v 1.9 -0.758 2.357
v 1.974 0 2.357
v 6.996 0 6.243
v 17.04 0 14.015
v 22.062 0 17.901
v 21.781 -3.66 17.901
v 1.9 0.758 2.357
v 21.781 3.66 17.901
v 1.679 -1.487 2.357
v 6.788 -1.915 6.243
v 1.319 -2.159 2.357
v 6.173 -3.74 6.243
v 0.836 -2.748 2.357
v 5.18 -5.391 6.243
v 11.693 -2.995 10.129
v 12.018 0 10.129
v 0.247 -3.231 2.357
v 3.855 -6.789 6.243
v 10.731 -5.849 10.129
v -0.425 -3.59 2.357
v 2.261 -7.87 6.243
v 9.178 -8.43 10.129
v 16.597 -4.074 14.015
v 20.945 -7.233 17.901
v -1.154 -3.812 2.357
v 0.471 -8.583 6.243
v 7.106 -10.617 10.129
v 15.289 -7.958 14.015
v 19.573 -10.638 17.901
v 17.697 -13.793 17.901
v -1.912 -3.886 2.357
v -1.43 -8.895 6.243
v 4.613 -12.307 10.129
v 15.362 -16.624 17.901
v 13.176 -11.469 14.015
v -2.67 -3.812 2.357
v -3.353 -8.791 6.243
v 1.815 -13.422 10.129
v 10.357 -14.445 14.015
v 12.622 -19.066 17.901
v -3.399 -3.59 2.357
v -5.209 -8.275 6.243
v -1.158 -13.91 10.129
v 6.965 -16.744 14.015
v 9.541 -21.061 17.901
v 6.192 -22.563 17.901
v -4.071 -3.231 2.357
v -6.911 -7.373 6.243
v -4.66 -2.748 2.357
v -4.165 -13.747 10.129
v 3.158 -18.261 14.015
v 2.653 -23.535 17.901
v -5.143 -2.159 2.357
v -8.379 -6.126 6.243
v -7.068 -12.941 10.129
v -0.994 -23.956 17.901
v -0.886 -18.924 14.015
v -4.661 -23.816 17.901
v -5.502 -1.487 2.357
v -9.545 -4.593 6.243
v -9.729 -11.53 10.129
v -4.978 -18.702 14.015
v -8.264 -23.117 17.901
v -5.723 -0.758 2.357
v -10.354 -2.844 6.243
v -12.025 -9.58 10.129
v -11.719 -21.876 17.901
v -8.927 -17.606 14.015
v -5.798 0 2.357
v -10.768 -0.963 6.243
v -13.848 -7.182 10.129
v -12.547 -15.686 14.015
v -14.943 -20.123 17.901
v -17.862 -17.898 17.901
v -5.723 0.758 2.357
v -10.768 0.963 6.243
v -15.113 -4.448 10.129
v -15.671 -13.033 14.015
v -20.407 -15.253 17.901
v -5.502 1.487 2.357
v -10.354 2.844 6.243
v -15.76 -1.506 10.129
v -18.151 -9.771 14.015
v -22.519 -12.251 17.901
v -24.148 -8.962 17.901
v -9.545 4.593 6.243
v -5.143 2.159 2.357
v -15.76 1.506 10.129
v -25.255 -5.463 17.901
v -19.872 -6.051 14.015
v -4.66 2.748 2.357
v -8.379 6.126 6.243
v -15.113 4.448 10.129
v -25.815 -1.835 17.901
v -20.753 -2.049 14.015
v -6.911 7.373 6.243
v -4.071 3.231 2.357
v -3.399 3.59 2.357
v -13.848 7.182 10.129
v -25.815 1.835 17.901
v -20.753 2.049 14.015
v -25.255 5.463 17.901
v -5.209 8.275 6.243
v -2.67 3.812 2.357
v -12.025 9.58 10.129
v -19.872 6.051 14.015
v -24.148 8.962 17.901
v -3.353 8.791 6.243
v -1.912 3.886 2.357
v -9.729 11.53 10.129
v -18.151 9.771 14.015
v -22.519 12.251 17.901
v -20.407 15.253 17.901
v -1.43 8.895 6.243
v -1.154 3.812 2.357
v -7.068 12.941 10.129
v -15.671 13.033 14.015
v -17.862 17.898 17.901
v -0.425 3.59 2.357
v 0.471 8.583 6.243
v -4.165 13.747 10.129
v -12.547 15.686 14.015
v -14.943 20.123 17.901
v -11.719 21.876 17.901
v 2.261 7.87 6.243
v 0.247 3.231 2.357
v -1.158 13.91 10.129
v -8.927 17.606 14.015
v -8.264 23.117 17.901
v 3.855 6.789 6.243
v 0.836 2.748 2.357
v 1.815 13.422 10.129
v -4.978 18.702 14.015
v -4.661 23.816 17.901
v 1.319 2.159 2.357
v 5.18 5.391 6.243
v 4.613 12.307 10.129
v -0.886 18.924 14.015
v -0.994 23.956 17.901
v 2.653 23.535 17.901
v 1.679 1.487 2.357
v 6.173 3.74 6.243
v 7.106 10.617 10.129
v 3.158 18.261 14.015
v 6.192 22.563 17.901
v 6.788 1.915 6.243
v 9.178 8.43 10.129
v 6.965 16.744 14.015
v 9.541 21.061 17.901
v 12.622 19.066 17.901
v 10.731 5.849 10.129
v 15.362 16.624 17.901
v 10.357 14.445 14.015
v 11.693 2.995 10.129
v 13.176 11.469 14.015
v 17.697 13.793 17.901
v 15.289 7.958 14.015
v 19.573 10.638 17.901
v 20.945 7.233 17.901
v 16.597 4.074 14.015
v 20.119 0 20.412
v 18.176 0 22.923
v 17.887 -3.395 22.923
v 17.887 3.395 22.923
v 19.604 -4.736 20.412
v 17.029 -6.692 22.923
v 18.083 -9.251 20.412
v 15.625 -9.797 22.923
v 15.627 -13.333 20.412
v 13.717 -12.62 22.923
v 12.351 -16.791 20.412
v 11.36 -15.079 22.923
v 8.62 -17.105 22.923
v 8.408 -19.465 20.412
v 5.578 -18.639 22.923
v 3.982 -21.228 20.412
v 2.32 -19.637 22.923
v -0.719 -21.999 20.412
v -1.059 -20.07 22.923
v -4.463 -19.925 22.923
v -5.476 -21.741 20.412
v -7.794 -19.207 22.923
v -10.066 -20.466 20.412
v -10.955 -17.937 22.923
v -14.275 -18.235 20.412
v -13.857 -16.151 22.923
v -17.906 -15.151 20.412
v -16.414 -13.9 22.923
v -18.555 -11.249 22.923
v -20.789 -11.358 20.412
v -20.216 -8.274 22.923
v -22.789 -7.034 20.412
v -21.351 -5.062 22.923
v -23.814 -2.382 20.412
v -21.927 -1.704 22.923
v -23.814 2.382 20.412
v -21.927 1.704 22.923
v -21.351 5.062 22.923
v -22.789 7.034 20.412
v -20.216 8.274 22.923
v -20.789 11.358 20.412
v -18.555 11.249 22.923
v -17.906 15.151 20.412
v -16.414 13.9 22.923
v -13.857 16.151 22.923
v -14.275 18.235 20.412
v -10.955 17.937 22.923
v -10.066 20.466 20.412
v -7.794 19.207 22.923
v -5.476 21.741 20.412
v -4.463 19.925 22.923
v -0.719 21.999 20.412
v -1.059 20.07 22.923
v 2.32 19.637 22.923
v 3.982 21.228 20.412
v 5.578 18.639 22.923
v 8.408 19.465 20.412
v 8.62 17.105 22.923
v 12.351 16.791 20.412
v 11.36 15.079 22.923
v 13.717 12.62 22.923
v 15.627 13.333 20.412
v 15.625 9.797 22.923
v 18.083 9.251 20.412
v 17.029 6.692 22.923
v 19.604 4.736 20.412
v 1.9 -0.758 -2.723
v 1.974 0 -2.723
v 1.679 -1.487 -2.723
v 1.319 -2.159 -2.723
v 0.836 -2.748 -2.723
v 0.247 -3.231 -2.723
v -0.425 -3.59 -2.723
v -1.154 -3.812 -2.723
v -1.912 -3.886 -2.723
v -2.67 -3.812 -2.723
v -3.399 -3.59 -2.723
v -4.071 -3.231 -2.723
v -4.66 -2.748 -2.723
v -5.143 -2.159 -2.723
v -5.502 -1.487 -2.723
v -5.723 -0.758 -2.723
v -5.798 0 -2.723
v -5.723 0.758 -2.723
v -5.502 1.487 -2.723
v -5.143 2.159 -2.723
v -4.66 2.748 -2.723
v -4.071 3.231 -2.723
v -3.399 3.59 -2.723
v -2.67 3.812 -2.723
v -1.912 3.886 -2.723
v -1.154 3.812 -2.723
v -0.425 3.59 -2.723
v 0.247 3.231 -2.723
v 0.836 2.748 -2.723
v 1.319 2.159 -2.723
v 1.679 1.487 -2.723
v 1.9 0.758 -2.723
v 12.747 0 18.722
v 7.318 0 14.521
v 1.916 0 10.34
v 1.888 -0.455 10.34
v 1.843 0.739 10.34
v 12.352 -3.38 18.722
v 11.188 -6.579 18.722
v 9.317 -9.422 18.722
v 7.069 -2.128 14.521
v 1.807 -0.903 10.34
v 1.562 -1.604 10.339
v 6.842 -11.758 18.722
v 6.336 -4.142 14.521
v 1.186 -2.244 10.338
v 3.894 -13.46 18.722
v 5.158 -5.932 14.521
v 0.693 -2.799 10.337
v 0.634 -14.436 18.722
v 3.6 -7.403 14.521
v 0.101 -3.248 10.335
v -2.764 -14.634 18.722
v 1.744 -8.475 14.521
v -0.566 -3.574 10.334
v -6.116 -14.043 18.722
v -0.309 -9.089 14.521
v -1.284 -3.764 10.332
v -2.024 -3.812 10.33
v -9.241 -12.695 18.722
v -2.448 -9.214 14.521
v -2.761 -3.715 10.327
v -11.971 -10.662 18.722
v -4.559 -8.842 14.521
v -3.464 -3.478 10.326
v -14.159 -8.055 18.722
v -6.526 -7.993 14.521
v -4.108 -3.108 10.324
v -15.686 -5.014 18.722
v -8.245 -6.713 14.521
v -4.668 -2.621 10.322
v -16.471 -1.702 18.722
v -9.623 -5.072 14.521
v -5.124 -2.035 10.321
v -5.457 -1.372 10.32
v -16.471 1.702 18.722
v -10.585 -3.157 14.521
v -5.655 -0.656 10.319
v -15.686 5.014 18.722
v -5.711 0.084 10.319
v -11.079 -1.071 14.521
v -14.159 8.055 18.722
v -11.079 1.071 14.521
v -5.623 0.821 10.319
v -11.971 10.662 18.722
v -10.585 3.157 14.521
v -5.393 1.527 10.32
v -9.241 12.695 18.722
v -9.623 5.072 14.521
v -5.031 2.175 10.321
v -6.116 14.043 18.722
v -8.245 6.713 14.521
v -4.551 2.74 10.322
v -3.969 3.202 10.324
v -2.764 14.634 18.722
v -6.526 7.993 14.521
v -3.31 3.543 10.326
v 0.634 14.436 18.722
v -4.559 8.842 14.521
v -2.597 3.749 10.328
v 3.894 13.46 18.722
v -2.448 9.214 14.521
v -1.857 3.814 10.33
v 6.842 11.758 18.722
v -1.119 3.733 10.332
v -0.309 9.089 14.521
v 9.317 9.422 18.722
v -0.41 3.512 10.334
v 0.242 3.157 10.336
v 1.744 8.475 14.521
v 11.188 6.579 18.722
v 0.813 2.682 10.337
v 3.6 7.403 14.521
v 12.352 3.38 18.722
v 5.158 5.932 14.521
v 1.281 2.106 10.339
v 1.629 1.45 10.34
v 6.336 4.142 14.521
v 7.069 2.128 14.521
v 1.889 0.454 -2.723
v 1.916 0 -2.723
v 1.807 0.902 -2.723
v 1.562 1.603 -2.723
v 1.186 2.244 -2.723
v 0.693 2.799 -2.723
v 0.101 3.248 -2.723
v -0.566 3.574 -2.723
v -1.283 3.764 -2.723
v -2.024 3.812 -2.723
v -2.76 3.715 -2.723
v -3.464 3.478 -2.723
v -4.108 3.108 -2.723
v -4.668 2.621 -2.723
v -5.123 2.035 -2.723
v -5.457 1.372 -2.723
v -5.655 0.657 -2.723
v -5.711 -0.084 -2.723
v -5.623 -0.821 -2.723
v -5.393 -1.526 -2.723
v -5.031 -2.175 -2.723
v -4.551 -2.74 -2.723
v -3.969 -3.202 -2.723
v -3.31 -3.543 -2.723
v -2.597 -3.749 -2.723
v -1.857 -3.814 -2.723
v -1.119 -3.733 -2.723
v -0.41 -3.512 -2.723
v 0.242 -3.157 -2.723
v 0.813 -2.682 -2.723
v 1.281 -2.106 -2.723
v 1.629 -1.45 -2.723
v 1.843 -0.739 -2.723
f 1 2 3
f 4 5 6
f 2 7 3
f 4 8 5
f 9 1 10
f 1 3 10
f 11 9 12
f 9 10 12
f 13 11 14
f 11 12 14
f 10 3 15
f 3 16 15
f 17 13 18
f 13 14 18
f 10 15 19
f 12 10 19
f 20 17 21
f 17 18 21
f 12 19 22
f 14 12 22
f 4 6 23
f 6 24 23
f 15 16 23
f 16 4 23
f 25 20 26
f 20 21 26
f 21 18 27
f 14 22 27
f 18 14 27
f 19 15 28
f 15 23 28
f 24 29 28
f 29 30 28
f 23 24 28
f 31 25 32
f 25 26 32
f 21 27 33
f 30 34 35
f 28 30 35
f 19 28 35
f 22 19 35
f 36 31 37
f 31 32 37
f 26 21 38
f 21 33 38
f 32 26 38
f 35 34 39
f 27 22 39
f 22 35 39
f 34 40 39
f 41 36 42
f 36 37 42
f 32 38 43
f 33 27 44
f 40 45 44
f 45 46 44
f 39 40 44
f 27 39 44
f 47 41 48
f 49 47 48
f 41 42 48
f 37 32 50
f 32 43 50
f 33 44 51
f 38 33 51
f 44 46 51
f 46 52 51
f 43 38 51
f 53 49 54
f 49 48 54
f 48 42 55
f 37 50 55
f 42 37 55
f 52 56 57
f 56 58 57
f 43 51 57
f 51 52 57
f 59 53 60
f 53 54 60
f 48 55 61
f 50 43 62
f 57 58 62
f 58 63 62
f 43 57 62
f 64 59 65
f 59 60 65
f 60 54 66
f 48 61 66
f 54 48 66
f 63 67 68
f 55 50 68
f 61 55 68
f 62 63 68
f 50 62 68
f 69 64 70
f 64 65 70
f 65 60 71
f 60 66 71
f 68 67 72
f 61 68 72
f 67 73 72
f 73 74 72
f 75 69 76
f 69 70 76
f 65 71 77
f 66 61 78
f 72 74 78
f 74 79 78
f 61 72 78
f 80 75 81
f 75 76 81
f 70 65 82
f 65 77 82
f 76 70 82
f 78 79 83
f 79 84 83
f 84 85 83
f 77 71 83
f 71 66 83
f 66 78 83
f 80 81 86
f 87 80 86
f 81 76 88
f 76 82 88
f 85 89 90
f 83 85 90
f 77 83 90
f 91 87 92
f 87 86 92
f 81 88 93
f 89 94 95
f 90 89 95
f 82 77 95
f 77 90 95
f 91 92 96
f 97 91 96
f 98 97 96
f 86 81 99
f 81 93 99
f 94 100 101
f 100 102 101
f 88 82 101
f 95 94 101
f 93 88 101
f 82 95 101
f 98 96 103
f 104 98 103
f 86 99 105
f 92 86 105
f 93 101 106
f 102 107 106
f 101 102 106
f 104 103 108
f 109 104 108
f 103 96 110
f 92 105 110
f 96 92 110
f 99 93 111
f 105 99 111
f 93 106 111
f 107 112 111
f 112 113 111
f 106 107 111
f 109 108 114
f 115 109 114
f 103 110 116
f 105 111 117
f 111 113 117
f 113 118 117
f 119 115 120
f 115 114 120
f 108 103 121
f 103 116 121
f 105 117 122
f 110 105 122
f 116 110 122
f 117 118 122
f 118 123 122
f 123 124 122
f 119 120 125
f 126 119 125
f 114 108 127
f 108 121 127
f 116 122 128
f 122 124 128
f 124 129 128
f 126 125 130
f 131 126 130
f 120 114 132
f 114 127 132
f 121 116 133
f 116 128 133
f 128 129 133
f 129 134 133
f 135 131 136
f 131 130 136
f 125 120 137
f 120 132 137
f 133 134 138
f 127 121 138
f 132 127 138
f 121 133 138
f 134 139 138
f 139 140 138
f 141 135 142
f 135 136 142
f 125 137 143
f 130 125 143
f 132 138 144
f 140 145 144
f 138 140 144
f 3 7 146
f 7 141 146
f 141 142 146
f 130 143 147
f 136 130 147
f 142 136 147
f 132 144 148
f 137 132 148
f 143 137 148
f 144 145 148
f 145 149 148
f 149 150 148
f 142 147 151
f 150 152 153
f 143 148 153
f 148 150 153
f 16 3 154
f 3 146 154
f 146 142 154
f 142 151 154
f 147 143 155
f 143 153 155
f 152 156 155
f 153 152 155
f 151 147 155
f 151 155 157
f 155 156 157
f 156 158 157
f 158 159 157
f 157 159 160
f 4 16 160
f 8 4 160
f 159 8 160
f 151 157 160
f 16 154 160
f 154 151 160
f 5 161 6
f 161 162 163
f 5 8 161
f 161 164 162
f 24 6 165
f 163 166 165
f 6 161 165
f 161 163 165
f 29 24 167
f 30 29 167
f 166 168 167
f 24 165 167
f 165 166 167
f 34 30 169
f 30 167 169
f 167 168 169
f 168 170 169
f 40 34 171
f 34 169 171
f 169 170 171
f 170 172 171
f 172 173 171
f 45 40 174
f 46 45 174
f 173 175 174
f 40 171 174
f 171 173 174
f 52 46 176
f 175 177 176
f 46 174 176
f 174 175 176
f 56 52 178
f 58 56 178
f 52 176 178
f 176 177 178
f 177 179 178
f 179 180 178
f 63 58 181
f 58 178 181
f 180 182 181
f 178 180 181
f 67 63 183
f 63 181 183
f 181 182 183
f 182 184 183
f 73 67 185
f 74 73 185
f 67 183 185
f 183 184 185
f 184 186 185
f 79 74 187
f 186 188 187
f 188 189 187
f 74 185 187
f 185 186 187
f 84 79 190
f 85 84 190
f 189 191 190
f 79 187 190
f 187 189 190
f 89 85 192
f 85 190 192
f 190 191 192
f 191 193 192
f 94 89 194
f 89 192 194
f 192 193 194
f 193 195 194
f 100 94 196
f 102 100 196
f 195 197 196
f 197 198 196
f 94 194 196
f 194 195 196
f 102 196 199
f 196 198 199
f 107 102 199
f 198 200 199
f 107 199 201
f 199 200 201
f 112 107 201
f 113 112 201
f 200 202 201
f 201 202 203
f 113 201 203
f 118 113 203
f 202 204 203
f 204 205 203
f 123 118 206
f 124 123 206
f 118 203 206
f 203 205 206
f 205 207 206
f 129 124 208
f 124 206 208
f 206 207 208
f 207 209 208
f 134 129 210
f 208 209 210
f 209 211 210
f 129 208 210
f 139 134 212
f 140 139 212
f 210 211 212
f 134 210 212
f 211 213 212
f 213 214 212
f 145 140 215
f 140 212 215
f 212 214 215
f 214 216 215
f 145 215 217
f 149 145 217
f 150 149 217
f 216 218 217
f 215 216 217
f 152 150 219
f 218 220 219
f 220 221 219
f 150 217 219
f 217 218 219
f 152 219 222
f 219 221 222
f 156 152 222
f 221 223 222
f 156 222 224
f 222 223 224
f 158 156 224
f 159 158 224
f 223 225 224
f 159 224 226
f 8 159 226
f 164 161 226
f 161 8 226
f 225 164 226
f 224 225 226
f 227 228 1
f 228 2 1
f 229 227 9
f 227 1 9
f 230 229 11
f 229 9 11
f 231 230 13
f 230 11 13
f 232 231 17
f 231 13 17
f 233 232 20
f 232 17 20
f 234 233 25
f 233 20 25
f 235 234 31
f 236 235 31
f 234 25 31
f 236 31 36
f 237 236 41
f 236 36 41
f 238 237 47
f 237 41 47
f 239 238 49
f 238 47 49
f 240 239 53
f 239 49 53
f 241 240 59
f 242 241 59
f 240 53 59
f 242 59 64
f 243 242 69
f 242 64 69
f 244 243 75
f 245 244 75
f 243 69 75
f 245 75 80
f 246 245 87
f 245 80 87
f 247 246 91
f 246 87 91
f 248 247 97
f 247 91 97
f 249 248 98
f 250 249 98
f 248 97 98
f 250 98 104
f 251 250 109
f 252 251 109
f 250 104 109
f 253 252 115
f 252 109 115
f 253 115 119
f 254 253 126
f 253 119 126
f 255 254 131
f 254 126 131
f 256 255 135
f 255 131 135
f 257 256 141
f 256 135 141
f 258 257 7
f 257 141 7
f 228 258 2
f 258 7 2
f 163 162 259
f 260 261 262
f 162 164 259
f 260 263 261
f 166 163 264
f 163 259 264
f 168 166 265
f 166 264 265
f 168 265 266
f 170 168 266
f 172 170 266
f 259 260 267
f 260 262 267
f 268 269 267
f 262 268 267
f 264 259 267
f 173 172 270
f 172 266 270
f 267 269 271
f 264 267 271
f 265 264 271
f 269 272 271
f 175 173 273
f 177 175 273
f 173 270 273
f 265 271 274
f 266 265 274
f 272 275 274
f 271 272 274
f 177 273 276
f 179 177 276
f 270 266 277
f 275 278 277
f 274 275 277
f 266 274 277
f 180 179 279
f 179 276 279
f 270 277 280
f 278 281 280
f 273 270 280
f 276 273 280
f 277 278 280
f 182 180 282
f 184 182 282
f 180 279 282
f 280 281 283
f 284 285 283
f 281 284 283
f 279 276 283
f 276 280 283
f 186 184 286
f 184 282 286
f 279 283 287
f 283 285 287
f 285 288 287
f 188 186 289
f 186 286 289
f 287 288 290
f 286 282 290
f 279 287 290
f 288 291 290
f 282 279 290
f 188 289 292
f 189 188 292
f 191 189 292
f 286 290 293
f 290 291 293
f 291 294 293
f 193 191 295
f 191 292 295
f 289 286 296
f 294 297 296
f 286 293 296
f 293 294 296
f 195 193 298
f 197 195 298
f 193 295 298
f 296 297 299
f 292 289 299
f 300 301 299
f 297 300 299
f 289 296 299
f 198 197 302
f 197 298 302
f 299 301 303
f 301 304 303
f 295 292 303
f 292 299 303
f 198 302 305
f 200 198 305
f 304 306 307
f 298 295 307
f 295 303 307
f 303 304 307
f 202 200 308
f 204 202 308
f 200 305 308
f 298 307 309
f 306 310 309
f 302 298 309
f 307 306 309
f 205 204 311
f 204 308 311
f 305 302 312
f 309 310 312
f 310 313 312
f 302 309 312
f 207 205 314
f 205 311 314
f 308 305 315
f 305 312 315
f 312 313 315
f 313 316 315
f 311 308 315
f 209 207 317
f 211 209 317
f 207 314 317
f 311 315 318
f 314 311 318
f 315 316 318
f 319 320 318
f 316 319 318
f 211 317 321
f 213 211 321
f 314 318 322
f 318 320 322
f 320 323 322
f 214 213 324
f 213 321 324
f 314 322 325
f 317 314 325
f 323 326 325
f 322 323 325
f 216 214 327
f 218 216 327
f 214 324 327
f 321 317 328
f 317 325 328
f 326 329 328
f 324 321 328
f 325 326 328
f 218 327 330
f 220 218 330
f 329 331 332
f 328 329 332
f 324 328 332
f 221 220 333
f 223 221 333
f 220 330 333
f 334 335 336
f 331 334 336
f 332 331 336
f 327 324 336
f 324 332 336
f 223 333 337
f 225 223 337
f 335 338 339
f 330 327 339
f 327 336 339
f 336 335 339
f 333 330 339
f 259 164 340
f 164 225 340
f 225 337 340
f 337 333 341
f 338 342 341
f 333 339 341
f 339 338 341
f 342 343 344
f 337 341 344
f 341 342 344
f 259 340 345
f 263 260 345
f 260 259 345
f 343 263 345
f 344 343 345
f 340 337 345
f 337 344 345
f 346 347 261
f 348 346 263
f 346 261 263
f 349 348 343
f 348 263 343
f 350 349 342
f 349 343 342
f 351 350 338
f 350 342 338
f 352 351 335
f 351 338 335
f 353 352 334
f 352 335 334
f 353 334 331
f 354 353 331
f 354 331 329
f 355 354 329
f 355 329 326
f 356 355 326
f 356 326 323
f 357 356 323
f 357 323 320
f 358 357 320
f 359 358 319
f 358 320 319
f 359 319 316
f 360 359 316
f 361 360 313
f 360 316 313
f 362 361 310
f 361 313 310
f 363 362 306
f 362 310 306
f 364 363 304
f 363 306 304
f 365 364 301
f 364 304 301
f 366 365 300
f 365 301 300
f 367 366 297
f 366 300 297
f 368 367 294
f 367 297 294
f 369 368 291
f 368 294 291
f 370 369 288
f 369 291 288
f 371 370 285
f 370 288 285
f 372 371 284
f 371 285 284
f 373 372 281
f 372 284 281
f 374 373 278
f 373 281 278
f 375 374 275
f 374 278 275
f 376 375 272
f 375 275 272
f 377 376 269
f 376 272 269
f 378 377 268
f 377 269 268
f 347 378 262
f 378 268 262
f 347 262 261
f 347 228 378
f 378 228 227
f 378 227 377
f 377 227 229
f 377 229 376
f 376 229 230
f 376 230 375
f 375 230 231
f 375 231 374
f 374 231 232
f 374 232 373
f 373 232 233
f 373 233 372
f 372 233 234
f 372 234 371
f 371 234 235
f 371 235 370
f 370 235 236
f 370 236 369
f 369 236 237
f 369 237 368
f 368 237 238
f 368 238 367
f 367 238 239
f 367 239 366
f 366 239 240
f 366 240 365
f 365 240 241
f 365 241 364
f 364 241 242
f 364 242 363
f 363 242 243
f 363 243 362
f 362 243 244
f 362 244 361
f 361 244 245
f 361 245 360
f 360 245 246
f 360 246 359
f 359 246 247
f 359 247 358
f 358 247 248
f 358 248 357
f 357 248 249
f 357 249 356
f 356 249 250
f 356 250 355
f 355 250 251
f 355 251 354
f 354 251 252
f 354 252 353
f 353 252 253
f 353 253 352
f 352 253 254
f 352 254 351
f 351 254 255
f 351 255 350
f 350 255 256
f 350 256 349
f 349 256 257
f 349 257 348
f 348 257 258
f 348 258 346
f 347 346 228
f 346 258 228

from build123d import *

# Parameters (mm, degrees)
F2_R      = 3.813781
F3_DEPTH  = 38.1
F4_R      = 3.020529
F5_DEPTH  = 14.0716
F3_FACE_R = 3.813781
F6_DEPTH  = 15.24


with BuildPart() as f1:
    # F0 (on Front) → F1 (revolve)
    with BuildSketch(Plane.XZ):
        Polygon((-1.911807, -2.718227), (1.97439, -2.723357), (1.97439, 2.356643), (22.062188, 17.901429), (18.175991, 22.923379), (-1.911807, 7.378592), align=None)
    revolve(axis=Axis((-1.911807, 0, 2.330183), (0, 0, -1)))

    # F2 (on Top) → F3 (cut)
    with BuildSketch(Plane.XY):
        with Locations((-1.898092, 0)):
            Circle(F2_R)
    extrude(amount=F3_DEPTH, mode=Mode.SUBTRACT)

    # F4 (on Top) → F5 (cut)
    with BuildSketch(Plane.XY):
        with Locations((-1.891657, 0)):
            Circle(F4_R)
    extrude(amount=F5_DEPTH, mode=Mode.SUBTRACT)

    # F3_face (on face) → F6 (cut)
    with BuildSketch(Plane(origin=(-1.898092, 0, 0), x_dir=(1, 0, 0), z_dir=(0, 0, 1))):
        Circle(F3_FACE_R)
    extrude(amount=-F6_DEPTH, mode=Mode.SUBTRACT)


solid = f1.part
